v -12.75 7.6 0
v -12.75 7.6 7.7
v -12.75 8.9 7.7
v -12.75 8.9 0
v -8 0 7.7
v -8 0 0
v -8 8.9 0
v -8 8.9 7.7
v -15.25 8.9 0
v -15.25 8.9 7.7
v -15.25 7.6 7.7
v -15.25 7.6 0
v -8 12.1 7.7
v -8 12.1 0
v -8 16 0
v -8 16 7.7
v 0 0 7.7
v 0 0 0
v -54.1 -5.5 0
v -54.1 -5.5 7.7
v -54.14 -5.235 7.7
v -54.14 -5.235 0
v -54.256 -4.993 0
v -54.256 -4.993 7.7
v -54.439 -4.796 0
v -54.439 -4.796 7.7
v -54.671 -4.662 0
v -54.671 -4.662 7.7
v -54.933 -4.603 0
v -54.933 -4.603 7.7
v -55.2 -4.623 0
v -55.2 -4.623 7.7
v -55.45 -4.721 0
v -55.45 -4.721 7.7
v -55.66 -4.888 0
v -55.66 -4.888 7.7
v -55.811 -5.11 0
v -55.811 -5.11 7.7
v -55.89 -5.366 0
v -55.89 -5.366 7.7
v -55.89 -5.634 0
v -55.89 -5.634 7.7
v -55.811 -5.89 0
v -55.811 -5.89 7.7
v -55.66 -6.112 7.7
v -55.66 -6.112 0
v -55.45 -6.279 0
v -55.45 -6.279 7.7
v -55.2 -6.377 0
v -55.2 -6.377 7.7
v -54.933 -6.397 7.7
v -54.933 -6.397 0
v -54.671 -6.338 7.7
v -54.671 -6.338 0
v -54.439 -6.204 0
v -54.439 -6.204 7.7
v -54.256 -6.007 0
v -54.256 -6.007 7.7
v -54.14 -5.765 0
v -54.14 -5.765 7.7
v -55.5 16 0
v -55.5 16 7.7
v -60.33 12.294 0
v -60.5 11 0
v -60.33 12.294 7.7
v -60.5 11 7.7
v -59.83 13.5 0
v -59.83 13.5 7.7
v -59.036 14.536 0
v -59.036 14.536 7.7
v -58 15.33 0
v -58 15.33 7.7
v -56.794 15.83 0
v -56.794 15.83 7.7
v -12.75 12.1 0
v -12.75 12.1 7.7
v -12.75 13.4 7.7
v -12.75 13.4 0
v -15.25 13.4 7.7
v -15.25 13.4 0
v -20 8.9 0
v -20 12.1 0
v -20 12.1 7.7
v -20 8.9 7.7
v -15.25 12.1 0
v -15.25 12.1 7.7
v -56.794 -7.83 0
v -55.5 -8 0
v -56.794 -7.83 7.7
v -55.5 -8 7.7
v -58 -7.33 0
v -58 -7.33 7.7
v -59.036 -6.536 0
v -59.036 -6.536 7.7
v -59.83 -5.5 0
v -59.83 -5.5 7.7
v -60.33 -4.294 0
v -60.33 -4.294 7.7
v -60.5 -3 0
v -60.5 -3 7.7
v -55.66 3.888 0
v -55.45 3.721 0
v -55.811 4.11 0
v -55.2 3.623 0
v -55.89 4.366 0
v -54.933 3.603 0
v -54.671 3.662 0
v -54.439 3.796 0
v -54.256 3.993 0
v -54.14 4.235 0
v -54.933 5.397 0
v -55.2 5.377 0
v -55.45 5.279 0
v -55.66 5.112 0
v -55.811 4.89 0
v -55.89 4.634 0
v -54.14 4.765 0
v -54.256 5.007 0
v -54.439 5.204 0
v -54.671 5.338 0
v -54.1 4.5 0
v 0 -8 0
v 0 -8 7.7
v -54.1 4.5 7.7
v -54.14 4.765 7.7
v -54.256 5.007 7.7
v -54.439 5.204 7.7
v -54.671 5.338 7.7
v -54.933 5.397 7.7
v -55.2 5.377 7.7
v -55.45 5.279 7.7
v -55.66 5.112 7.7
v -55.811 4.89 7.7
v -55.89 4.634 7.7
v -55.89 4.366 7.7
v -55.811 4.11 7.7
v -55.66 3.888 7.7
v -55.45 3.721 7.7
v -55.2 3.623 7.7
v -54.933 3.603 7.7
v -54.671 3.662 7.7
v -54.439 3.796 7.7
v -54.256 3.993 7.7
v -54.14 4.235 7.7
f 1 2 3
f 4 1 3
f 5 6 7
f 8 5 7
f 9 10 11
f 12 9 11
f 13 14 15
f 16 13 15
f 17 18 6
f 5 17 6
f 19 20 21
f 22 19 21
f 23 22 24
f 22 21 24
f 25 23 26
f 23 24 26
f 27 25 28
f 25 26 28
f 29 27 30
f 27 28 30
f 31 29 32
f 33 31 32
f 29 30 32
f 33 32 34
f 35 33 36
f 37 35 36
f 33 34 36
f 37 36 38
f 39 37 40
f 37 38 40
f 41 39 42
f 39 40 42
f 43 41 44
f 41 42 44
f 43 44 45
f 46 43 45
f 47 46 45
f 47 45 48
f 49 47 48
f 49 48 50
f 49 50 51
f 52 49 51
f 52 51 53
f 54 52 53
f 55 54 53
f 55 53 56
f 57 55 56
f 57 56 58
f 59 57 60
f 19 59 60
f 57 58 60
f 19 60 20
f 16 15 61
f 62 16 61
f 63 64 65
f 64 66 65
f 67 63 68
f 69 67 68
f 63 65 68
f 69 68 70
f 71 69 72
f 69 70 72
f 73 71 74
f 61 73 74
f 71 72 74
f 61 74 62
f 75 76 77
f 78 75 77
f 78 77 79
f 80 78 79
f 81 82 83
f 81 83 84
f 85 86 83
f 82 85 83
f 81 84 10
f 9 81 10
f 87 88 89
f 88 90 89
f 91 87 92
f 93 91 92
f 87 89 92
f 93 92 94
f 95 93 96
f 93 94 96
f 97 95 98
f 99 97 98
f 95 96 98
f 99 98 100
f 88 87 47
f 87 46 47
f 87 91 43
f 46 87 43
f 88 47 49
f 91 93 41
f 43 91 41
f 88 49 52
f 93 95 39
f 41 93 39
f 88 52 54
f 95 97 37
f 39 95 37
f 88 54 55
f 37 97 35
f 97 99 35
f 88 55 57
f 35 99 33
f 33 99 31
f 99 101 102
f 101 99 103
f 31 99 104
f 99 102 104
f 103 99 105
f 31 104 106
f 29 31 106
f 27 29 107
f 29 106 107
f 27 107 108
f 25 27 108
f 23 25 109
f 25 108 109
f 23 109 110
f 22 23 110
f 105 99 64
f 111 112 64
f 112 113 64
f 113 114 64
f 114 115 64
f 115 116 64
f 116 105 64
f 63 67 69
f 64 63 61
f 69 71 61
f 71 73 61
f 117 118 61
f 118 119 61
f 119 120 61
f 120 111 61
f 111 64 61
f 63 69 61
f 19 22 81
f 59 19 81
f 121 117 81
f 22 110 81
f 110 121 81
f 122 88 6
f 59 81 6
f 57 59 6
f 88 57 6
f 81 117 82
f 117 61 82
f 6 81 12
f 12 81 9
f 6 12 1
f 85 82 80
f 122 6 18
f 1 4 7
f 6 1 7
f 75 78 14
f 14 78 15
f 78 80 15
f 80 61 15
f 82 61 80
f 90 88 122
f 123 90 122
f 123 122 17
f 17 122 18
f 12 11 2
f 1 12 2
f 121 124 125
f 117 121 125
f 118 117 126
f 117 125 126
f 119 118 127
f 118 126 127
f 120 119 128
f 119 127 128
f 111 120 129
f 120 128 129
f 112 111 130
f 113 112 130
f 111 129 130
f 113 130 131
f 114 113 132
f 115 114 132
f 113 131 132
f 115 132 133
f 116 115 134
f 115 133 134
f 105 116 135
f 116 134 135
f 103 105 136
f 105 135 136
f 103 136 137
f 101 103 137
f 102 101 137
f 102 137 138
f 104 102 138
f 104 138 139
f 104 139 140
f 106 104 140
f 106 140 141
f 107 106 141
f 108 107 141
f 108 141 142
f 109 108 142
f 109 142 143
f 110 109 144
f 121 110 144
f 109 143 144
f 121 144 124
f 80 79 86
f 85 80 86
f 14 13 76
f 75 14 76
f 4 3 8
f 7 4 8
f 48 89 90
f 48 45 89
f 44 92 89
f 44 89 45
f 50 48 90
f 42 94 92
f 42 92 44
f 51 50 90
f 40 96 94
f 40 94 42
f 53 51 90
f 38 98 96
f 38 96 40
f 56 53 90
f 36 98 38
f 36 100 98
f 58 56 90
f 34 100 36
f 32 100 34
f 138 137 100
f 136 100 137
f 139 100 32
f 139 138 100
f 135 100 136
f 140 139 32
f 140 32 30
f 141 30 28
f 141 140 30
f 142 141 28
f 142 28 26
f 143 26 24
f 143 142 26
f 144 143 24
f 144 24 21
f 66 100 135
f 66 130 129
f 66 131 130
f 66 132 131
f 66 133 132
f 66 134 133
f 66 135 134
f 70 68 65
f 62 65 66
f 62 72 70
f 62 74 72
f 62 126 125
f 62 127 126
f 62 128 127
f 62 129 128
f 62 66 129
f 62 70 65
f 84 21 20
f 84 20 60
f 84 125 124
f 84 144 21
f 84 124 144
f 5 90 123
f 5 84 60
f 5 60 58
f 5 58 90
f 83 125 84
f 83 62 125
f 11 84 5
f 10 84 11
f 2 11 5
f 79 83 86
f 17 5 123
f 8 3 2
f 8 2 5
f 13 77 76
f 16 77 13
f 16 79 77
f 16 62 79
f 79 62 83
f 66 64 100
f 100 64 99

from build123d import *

# Parameters (mm, degrees)
F1_DEPTH = 7.7
F2_R     = 0.9
F3_DEPTH = 7.7
F4_R     = 5


with BuildPart() as f1:
    # F0 (on Top) → F1 (new body)
    with BuildSketch(Plane.XY):
        Polygon((0, -8), (0, 0), (-8, 0), (-8, 16), (-60.5, 16), (-60.5, -8), align=None)
    extrude(amount=F1_DEPTH)

    # F2 (on face) → F3 (cut, through all)
    with BuildSketch(Plane.XY.offset(7.7)):
        with Locations((-55, 4.5)):
            Circle(F2_R)
        with Locations((-55, -5.5)):
            Circle(F2_R)
        Polygon((-12.75, 8.9), (-8, 8.9), (-8, 12.1), (-12.75, 12.1), (-12.75, 13.4), (-15.25, 13.4), (-15.25, 12.1), (-20, 12.1), (-20, 8.9), (-15.25, 8.9), (-15.25, 7.6), (-12.75, 7.6), align=None)
    extrude(amount=-F3_DEPTH, mode=Mode.SUBTRACT)

    # F4
    f4_edges = [f1.edges().sort_by_distance(p)[0] for p in [
        (-60.5, 16, 3.85),
        (-60.5, -8, 3.85),
    ]]
    fillet(f4_edges, radius=F4_R)


solid = f1.part
